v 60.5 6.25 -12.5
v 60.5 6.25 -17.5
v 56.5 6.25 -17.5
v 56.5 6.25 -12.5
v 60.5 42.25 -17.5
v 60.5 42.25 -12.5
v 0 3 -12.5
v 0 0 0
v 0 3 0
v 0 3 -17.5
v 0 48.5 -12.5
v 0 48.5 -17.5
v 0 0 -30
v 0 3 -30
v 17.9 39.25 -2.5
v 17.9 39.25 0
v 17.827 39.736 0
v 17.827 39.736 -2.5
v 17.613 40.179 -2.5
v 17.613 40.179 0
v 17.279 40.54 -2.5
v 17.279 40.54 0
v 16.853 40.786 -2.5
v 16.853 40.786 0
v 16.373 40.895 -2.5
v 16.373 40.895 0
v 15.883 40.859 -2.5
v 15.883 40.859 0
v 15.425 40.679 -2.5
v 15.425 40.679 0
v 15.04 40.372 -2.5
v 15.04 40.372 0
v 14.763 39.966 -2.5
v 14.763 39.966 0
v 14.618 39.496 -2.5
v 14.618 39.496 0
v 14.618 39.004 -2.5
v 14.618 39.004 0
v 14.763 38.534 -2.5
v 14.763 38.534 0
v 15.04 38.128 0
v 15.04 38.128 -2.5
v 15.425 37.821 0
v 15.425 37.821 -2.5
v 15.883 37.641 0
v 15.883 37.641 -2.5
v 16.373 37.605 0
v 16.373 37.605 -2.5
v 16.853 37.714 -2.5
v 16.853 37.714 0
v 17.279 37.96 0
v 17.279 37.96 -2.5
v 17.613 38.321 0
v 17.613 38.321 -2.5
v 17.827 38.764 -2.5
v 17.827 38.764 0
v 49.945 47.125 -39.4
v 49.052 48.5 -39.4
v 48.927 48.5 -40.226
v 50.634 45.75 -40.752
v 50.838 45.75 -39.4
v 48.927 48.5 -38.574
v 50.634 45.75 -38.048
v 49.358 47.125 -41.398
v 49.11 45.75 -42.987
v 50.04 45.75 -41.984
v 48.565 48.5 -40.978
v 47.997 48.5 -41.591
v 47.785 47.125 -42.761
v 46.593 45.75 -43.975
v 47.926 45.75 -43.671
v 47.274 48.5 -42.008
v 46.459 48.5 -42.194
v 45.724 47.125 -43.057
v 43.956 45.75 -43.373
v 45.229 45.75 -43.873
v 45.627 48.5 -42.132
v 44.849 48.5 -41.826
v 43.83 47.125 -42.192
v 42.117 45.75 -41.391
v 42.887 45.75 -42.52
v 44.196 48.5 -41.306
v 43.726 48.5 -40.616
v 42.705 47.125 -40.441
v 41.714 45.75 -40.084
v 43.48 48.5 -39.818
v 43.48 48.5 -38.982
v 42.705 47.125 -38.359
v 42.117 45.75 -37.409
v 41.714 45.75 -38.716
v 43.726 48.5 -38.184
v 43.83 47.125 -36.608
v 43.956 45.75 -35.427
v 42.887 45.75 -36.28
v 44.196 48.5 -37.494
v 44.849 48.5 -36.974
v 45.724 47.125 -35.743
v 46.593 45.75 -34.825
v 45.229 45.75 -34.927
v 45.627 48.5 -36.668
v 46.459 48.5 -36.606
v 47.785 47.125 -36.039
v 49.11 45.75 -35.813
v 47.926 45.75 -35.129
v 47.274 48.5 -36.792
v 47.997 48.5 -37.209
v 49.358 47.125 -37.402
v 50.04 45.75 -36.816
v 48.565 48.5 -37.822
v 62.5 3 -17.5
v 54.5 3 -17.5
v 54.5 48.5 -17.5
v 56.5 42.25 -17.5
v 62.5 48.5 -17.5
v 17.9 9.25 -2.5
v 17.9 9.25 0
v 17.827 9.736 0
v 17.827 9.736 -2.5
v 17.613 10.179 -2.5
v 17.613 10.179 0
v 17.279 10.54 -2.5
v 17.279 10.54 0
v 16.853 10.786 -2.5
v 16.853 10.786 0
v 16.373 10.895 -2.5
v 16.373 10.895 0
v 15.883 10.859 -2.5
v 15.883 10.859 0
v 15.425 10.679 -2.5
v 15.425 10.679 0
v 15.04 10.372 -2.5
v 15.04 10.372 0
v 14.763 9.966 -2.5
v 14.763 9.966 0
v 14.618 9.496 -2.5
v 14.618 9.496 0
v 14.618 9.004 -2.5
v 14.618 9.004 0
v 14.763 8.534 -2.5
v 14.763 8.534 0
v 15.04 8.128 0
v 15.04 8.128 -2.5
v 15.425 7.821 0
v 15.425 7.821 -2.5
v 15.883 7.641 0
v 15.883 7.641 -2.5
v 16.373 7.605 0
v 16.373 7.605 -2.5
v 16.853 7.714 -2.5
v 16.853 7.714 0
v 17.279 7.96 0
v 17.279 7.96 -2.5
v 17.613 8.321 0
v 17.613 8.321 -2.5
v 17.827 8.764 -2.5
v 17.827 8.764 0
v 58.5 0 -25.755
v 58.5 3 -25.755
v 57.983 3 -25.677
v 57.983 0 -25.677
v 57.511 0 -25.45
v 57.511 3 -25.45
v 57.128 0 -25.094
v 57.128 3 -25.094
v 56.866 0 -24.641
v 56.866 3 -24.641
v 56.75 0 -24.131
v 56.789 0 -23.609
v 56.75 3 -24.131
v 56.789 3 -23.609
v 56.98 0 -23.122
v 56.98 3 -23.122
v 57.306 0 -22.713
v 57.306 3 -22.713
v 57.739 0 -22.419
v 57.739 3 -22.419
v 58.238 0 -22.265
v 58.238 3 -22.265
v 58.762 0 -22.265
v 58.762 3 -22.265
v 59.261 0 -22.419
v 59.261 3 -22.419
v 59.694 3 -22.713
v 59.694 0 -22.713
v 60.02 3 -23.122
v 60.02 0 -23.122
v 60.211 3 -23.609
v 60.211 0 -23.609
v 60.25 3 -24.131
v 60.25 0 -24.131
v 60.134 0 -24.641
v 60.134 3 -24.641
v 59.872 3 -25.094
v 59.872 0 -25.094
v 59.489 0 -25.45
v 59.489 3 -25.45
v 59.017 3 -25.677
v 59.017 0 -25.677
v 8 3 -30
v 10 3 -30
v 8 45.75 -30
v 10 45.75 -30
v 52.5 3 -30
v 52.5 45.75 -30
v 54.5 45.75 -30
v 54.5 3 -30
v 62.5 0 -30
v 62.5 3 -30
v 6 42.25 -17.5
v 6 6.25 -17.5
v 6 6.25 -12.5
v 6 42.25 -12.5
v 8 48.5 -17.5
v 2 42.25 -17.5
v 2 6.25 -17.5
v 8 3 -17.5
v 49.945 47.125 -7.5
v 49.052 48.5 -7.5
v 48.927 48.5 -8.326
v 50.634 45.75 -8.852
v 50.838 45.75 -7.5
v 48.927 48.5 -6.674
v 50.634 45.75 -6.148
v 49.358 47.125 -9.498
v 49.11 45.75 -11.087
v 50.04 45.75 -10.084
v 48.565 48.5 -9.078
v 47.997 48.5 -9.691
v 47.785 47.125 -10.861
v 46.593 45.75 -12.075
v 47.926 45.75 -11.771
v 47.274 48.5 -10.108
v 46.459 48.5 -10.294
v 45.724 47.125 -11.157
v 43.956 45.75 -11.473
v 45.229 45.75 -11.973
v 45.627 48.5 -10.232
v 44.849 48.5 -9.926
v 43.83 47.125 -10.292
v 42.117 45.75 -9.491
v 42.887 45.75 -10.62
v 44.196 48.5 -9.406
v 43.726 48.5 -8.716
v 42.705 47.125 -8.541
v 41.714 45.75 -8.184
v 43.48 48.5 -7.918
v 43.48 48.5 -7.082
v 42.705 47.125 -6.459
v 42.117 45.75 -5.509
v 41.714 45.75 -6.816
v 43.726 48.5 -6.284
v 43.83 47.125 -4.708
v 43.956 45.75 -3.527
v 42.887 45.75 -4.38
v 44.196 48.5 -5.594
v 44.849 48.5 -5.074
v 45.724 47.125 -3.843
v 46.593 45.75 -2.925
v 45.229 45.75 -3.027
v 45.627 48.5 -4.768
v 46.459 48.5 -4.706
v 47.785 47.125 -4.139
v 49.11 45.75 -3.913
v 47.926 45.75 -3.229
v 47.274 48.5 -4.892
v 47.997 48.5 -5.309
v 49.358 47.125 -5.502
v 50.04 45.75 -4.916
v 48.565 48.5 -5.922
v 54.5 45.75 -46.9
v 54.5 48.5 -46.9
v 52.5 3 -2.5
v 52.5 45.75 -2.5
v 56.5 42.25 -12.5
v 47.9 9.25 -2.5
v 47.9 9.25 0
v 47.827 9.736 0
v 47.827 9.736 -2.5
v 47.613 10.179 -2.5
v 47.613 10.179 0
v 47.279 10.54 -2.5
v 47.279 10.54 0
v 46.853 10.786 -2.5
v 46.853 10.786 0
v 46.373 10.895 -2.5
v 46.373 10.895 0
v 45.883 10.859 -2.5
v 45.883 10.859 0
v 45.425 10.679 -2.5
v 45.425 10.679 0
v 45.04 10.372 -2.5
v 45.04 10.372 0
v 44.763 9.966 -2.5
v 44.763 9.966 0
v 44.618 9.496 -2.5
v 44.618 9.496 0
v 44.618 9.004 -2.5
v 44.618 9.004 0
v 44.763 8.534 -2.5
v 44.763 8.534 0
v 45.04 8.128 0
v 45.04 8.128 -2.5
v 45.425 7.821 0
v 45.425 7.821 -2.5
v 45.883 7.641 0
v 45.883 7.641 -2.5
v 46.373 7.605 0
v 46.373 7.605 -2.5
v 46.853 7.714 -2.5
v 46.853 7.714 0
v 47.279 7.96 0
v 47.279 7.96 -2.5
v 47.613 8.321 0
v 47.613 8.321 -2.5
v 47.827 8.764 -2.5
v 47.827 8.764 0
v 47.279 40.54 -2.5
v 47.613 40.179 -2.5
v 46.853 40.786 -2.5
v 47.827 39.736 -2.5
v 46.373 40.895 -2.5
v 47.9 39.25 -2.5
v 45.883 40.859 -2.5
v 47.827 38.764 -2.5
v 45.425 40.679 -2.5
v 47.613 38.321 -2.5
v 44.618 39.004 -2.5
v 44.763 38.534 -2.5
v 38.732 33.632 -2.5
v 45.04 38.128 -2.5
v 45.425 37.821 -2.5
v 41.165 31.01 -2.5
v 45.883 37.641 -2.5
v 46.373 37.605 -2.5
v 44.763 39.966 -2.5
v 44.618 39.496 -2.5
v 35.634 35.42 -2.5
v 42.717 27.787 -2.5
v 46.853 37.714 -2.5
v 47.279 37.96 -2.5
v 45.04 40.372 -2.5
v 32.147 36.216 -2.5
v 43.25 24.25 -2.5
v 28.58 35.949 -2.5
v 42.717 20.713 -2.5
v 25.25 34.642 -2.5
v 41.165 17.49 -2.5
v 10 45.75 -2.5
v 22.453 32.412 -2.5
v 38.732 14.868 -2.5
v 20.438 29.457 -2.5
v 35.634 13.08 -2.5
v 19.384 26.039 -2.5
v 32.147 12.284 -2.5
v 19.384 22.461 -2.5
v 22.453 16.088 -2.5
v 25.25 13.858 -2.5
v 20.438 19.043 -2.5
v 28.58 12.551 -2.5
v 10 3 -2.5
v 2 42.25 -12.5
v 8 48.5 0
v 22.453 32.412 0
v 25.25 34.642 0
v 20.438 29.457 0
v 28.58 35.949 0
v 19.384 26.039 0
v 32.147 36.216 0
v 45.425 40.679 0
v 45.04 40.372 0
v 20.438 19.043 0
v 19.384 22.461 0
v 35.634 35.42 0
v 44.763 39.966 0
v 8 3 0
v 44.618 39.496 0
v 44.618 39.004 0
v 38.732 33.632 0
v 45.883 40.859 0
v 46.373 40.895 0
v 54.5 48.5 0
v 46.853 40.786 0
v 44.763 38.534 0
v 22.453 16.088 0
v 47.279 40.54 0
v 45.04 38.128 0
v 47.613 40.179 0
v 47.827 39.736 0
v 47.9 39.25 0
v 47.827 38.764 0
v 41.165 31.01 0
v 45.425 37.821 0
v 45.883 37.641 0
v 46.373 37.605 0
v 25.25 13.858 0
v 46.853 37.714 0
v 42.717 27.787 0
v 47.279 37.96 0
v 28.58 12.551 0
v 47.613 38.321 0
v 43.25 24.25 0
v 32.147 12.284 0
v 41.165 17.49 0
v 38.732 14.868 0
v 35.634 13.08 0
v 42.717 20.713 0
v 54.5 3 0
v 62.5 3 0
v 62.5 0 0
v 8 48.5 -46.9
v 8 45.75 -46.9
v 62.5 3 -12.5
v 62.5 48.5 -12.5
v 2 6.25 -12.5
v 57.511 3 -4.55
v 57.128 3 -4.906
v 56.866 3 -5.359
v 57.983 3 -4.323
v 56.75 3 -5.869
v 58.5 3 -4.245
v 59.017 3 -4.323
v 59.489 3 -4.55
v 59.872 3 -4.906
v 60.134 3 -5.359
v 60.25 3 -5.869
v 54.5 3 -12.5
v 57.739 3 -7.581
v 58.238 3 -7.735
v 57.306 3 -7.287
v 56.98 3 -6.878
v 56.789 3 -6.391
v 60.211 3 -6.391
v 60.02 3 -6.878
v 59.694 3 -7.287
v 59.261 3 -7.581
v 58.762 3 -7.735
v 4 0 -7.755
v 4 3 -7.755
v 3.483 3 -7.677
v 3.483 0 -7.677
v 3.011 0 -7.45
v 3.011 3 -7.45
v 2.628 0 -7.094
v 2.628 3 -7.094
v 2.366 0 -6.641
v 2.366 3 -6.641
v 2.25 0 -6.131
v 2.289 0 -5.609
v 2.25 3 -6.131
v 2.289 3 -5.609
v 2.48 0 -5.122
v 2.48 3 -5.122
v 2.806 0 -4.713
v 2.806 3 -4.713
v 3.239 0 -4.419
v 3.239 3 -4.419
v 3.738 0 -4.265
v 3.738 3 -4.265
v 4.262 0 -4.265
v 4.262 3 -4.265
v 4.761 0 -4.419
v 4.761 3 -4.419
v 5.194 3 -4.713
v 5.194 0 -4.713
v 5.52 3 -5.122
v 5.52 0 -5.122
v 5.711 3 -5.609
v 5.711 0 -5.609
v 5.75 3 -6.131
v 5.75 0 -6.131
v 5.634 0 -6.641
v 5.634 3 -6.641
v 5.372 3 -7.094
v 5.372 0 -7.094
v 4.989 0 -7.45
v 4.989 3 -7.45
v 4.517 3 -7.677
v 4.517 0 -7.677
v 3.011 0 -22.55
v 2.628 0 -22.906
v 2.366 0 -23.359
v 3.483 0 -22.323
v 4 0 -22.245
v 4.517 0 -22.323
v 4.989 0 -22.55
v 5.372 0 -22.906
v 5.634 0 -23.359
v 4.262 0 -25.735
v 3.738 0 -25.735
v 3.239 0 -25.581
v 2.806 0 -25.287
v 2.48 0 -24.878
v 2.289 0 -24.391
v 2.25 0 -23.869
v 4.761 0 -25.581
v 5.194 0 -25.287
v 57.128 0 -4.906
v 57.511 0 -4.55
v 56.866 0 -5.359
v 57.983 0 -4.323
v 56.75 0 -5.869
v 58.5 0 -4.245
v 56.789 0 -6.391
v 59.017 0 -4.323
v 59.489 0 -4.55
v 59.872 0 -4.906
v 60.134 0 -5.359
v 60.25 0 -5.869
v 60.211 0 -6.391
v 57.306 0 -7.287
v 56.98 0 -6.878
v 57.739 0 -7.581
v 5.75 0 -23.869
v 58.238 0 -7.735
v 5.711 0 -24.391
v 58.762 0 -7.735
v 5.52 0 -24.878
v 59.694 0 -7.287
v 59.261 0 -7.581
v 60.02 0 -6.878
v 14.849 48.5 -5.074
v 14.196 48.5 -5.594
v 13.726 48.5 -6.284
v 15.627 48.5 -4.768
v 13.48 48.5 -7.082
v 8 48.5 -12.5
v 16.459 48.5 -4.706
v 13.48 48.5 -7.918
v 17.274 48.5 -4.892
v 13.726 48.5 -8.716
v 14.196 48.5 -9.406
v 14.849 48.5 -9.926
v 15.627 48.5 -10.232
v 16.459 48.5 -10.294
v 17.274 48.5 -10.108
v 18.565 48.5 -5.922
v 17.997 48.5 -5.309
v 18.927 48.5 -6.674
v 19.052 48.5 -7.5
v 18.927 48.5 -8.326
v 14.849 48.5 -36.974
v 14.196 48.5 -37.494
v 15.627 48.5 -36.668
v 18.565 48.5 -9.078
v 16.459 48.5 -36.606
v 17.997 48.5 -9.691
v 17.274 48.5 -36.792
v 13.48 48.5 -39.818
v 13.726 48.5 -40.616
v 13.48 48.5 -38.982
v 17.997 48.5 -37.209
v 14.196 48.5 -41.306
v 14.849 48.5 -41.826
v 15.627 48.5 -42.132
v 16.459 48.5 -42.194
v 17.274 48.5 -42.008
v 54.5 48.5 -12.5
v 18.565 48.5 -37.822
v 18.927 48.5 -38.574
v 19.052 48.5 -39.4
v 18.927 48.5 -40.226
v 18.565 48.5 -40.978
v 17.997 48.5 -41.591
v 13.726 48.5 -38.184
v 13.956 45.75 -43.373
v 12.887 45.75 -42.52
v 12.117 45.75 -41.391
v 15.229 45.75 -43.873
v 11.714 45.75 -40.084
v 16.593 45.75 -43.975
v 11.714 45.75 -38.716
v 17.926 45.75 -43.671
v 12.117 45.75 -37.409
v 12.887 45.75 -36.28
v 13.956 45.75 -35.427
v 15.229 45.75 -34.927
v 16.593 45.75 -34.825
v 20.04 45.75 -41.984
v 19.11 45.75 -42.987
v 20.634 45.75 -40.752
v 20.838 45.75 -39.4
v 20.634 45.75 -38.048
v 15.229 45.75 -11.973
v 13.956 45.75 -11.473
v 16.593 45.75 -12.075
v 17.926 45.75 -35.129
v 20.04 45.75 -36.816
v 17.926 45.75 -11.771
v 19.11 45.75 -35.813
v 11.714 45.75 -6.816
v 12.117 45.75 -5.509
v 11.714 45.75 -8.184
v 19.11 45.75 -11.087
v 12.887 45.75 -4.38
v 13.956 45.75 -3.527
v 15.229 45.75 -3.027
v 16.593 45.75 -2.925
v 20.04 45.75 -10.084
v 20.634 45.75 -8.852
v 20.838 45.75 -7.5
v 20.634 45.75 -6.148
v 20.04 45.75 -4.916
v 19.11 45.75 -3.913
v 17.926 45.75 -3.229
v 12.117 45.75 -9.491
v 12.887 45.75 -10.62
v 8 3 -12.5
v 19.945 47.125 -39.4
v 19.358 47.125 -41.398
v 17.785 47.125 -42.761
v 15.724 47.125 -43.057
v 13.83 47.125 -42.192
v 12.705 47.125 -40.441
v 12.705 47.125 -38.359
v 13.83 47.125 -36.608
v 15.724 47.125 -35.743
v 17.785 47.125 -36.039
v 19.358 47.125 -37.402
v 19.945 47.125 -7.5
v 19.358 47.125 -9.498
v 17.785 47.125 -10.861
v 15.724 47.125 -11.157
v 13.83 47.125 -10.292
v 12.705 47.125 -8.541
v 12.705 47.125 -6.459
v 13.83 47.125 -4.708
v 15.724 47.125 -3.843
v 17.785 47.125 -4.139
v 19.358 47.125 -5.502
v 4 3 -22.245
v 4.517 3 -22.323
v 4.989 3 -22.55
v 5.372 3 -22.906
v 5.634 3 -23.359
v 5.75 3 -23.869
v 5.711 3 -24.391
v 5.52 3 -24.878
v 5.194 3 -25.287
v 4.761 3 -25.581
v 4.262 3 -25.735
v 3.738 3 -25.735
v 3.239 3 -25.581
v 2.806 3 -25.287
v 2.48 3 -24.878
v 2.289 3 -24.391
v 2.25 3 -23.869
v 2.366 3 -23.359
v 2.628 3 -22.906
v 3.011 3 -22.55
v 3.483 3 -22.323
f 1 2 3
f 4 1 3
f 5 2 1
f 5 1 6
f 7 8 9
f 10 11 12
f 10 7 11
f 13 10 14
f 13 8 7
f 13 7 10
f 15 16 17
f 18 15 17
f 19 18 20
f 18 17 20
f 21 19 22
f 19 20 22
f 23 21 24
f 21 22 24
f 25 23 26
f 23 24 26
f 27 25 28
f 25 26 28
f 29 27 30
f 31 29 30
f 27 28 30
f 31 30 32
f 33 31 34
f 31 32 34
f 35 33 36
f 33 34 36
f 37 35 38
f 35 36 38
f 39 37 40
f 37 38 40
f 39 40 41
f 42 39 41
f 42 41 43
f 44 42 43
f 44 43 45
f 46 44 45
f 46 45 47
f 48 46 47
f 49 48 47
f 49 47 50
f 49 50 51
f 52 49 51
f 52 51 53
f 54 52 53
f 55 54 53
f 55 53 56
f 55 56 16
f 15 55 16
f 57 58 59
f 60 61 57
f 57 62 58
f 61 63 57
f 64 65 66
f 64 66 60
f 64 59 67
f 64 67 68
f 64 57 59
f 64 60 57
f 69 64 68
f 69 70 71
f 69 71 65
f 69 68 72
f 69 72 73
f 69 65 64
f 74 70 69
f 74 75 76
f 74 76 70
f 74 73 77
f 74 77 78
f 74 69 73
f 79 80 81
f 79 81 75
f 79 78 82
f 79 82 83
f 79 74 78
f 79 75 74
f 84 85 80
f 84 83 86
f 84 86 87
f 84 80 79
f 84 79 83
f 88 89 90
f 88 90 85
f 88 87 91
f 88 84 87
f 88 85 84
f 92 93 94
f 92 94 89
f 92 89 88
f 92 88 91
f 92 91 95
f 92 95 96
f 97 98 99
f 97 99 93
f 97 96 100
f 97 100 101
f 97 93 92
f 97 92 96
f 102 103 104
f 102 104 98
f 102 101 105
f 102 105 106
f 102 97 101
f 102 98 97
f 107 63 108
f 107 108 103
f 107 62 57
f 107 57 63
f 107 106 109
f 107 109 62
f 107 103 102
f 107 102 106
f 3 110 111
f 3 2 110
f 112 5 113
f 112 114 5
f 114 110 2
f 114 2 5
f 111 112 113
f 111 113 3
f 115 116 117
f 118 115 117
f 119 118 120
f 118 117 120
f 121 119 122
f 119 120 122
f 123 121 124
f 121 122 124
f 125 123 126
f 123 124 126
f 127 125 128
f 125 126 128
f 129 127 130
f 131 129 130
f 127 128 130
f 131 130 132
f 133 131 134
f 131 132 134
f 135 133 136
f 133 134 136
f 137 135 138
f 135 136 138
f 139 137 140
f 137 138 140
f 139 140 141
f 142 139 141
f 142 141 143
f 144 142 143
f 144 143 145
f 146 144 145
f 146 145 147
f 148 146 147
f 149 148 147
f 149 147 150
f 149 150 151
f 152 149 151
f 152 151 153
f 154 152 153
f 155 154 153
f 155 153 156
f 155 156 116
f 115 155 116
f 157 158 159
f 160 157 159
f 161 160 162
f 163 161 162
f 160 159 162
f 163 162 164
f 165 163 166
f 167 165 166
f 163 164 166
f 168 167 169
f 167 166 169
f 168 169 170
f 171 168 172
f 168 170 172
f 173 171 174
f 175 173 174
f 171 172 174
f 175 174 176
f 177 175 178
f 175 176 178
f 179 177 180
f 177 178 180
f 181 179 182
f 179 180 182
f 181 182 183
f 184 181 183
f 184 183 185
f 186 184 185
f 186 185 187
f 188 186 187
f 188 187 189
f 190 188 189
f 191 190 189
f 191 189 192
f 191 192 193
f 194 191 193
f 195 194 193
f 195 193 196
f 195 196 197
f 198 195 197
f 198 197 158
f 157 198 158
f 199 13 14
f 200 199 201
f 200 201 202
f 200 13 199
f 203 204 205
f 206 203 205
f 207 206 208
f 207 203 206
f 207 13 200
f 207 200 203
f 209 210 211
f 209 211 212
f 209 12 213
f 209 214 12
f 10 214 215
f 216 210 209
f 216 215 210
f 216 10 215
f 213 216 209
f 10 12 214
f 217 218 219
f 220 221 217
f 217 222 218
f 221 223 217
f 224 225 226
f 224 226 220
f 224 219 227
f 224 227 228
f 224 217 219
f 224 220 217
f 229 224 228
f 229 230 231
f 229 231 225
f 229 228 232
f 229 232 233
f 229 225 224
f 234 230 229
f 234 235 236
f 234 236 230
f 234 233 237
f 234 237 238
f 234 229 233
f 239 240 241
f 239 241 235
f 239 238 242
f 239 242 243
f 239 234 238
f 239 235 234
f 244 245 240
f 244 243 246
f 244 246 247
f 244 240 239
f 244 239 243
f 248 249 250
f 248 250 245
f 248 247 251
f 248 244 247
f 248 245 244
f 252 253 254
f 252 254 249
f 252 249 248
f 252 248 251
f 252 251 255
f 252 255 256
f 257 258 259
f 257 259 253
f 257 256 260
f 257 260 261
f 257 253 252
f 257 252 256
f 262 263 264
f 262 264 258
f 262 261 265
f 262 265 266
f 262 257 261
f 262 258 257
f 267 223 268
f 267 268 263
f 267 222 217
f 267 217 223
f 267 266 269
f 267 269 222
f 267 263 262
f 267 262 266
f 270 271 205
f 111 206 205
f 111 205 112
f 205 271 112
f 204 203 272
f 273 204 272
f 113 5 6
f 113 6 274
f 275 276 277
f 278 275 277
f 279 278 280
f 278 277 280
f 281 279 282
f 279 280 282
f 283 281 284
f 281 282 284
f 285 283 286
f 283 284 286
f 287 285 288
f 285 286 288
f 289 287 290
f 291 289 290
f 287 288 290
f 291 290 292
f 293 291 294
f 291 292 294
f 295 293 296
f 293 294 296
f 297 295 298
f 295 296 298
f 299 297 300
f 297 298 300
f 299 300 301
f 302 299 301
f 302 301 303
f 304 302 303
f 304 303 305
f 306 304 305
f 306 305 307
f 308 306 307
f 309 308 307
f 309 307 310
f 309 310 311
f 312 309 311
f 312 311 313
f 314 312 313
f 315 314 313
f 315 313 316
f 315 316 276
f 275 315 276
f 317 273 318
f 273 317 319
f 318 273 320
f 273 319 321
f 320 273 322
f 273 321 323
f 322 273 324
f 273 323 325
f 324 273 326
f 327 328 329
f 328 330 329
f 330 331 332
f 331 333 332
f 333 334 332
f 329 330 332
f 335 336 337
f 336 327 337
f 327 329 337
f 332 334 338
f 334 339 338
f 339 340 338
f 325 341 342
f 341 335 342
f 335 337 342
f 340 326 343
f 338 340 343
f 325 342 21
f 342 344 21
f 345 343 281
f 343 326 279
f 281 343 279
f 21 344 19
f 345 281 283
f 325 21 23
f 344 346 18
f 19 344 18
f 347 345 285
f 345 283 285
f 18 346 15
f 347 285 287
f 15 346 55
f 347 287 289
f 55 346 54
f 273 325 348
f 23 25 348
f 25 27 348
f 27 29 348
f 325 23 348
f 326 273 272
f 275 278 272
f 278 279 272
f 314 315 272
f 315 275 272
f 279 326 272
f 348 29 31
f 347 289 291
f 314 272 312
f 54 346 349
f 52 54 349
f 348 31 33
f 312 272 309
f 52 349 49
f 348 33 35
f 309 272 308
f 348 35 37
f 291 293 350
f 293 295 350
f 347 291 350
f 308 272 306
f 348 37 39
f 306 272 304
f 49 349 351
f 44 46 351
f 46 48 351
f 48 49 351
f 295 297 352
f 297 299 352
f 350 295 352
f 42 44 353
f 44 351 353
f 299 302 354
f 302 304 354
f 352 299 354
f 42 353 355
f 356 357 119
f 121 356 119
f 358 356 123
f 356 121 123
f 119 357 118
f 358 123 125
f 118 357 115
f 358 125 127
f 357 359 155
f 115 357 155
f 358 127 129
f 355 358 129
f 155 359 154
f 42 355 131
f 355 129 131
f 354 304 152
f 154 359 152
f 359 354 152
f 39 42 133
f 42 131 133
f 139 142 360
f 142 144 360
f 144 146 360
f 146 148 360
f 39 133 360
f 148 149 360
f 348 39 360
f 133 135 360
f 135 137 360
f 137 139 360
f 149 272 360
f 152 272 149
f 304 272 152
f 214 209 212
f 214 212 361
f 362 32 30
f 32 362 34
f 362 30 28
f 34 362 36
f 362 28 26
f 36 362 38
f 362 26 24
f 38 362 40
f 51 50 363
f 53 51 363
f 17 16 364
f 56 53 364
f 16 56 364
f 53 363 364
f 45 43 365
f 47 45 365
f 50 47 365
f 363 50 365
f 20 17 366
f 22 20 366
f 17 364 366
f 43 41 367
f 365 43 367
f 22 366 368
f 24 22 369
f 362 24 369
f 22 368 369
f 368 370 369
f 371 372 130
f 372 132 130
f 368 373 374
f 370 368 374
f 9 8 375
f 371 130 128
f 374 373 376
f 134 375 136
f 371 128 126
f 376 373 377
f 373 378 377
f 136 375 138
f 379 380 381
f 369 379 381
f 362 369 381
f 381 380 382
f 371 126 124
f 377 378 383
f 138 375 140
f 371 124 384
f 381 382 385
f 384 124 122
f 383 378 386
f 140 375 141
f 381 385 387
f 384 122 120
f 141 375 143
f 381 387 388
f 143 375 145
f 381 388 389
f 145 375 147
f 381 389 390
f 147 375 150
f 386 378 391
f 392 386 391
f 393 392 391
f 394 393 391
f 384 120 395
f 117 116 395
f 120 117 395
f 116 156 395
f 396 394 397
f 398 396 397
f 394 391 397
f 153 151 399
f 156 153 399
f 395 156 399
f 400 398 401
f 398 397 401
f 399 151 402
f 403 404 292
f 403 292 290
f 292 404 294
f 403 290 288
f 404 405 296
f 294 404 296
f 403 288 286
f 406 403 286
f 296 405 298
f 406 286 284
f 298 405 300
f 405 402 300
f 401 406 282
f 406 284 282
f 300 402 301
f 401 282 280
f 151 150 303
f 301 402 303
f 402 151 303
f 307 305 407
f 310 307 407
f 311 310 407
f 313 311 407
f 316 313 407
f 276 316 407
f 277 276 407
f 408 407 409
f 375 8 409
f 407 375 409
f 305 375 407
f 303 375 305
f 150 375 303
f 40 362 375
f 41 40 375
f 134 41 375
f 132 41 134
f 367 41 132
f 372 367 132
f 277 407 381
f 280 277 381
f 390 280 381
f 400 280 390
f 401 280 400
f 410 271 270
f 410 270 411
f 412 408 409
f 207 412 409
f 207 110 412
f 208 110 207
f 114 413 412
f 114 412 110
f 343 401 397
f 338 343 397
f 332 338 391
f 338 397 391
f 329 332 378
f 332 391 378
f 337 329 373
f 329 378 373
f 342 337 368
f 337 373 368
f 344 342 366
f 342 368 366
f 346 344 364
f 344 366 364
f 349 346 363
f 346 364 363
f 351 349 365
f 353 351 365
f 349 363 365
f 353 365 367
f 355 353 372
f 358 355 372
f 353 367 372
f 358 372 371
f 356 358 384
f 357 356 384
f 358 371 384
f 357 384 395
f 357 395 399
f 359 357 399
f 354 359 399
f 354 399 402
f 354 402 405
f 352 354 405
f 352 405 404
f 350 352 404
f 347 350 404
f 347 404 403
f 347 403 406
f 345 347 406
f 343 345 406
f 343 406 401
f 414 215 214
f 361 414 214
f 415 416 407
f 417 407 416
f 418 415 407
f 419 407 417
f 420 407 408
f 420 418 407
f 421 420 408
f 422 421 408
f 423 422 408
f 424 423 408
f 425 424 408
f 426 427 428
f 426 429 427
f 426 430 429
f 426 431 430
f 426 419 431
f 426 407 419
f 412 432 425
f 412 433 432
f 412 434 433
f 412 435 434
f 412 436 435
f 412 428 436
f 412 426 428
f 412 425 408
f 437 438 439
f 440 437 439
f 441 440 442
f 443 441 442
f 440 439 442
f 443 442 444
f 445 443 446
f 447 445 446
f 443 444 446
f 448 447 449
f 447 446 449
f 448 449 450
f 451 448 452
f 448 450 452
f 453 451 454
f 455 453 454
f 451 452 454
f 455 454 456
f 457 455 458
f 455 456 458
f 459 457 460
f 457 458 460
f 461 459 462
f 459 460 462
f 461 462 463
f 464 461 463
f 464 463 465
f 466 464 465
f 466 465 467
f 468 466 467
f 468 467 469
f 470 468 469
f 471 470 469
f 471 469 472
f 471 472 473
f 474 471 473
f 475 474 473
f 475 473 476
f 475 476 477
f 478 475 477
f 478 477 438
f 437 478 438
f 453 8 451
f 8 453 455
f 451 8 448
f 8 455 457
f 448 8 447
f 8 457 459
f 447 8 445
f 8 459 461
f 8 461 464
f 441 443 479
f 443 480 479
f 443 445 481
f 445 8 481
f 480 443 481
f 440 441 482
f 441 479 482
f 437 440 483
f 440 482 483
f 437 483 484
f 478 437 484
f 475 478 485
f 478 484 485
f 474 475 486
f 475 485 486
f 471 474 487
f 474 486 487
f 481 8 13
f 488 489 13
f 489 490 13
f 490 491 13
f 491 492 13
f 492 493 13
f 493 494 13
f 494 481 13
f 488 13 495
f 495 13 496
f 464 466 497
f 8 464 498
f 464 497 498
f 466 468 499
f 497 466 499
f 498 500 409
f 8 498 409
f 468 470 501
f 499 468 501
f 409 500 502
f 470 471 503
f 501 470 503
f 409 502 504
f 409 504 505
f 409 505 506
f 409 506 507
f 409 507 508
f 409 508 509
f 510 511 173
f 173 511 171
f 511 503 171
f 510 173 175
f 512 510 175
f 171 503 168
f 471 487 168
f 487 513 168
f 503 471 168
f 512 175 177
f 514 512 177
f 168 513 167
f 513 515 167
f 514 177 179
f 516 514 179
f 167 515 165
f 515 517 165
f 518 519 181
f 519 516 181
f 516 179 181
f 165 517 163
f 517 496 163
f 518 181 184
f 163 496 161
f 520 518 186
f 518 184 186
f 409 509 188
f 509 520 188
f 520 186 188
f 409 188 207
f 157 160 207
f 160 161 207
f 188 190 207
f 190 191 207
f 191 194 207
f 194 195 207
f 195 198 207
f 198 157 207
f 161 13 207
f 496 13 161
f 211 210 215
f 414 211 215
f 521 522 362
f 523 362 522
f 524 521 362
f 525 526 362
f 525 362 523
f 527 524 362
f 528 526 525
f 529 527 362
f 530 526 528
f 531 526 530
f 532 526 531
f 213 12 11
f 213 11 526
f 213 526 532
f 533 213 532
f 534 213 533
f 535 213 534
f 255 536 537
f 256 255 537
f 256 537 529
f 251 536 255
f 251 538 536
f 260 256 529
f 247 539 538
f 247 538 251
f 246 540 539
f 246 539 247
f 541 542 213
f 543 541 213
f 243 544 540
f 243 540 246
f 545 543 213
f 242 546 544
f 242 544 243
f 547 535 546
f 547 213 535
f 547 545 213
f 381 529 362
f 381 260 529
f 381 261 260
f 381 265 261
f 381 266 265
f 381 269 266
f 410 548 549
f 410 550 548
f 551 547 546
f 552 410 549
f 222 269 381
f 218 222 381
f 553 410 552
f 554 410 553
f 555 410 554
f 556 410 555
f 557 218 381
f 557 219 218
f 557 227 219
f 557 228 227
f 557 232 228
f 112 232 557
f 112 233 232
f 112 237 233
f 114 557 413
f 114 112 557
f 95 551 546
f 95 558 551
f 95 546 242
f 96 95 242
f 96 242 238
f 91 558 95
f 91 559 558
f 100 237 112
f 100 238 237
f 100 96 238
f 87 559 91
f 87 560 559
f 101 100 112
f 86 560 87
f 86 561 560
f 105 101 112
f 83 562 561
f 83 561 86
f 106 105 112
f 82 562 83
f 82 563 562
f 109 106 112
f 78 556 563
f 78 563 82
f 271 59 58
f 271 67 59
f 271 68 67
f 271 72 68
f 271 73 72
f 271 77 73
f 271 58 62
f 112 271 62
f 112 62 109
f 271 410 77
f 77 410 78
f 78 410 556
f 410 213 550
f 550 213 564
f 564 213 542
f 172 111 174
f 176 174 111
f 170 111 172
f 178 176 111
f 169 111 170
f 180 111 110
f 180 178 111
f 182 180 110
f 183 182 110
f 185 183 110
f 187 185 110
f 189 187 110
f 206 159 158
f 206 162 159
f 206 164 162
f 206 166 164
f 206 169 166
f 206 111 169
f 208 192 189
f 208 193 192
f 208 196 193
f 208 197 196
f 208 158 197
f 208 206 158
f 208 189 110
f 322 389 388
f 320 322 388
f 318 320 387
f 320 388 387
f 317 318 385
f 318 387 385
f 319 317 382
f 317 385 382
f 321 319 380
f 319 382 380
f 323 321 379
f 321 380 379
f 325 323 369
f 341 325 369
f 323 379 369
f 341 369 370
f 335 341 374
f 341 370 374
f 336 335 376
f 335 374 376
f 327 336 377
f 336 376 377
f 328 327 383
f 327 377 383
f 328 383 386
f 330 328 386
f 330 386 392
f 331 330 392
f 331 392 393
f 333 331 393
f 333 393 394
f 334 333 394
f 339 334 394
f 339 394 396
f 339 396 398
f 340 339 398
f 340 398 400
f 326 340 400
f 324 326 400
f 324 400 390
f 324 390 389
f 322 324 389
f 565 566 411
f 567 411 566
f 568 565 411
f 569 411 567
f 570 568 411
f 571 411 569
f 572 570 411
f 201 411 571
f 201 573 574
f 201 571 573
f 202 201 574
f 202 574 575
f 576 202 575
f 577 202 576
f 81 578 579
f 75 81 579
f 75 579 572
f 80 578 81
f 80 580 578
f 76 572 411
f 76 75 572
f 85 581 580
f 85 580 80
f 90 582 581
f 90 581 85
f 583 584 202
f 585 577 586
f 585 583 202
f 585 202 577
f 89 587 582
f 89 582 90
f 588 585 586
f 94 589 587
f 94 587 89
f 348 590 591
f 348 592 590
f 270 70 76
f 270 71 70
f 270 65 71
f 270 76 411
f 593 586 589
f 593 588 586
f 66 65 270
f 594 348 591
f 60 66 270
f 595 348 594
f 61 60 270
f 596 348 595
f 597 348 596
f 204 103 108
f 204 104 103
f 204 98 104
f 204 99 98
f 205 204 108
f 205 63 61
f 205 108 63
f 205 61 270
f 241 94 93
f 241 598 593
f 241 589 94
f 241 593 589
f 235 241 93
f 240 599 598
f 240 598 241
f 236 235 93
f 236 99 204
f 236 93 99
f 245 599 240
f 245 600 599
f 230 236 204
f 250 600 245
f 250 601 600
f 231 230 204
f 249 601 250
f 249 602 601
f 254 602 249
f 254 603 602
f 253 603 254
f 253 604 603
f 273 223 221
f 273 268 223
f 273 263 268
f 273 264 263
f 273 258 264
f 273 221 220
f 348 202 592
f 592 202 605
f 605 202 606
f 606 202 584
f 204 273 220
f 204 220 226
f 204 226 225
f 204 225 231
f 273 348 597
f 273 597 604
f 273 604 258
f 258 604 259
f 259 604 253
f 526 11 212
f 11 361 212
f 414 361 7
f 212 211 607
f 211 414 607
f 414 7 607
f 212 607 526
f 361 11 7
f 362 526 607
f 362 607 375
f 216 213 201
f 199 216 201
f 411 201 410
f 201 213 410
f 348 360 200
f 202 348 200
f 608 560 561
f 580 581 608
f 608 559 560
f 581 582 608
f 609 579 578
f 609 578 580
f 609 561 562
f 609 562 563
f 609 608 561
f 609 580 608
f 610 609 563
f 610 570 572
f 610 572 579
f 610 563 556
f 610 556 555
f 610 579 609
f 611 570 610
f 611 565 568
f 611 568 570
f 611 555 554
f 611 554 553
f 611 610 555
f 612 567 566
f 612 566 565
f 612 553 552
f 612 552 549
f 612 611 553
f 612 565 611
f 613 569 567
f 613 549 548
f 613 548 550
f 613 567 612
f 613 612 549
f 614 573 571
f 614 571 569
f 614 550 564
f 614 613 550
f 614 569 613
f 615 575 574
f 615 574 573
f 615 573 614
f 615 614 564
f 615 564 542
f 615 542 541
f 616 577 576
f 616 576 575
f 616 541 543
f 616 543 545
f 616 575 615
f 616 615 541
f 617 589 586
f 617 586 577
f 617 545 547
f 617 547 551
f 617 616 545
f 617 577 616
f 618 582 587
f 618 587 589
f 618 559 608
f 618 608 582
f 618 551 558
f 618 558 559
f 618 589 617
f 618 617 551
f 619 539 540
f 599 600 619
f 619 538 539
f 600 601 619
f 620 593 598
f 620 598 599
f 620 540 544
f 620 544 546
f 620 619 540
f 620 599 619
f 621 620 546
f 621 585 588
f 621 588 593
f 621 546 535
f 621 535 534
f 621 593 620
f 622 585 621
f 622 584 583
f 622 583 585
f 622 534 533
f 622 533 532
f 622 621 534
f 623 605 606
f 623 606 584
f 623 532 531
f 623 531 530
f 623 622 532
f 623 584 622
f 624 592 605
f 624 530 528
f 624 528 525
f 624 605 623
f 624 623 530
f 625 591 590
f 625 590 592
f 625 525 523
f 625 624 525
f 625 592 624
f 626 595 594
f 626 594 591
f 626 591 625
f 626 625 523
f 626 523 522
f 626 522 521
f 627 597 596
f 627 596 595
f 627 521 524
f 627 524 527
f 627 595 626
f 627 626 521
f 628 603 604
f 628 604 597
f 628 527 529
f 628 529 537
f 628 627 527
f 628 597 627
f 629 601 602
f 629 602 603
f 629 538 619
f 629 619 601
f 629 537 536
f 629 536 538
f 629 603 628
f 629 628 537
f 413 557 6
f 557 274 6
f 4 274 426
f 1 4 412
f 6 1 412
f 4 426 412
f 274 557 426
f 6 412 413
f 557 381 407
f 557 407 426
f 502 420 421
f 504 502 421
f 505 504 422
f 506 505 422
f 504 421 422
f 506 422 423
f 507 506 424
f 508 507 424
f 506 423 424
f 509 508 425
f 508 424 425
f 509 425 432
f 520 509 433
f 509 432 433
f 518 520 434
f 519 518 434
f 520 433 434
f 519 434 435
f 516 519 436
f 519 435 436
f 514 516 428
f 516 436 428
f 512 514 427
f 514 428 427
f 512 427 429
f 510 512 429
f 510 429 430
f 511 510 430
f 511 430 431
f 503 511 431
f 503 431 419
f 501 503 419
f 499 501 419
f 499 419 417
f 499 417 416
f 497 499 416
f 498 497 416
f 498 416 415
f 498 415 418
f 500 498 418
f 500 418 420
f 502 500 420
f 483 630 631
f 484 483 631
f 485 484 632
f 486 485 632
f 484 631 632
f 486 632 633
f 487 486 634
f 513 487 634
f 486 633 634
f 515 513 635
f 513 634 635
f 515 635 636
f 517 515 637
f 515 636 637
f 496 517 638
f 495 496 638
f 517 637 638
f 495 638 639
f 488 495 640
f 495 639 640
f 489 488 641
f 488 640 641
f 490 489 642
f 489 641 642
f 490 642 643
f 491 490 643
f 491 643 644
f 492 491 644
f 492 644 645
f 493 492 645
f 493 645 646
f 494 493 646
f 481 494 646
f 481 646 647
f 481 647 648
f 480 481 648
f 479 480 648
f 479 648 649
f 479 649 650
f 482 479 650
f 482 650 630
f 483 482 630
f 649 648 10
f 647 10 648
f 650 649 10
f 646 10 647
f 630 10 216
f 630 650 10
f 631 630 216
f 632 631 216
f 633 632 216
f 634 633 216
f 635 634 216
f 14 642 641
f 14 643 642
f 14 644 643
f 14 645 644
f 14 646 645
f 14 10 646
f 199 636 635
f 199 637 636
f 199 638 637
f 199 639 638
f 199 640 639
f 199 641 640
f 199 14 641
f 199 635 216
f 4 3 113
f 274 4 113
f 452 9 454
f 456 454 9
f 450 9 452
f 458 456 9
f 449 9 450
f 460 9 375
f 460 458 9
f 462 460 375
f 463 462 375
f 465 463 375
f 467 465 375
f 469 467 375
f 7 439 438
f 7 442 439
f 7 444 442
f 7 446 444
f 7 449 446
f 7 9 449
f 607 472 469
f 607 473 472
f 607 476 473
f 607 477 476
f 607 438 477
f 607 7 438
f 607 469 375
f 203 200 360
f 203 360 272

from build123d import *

# Parameters (mm, degrees)
SKETCH1_W           = 82
SKETCH1_H           = 30
SKETCH1_R           = 2
BOSS_EXTRUDE1_DEPTH = 3
BOSS_EXTRUDE2_DEPTH = 42.5
SKETCH4_R           = 12
SKETCH4_R_2         = 1.65
CUT_EXTRUDE2_DEPTH  = 99.459382488
SKETCH7_W           = 19.5
SKETCH7_H           = 30
CUT_EXTRUDE4_DEPTH  = 98.109474306
SKETCH8_W           = 8
SKETCH8_H           = 5
BOSS_EXTRUDE3_DEPTH = 42.5
SKETCH8_3_R         = 1.755
CUT_EXTRUDE5_DEPTH  = 82.317279836
SKETCH9_W           = 4
SKETCH9_H           = 36
CUT_EXTRUDE6_DEPTH  = 80.26380006
SKETCH10_W          = 46.5
SKETCH10_H          = 46.9
SKETCH10_R          = 4.75
BOSS_EXTRUDE4_DEPTH = 3
BOSS_EXTRUDE4_DRAFT = -33
SKETCH12_W          = 8
SKETCH12_H          = 5
BOSS_EXTRUDE6_DEPTH = 3
CUT_EXTRUDE7_DEPTH  = 3
CUT_EXTRUDE8_DEPTH  = 0.25


with BuildPart() as part:
    # Sketch1 → Boss-Extrude1 (new body)
    with BuildSketch(Plane(origin=(0, 0, 0), x_dir=(1, 0, 0), z_dir=(0, 1, 0))):
        with Locations((41, 15)):
            Rectangle(SKETCH1_W, SKETCH1_H)
        with Locations(Location((78, 23.86, 0), (0, 0, 270))):
            Circle(SKETCH1_R, mode=Mode.SUBTRACT)
        with Locations(Location((78, 5, 0), (0, 0, 270))):
            Circle(SKETCH1_R, mode=Mode.SUBTRACT)
    extrude(amount=BOSS_EXTRUDE1_DEPTH)

    # Sketch2 → Boss-Extrude2 (add)
    with BuildSketch(Plane(origin=(0, 3, 0), x_dir=(1, 0, 0), z_dir=(0, 1, 0))):
        Polygon((52.5, 2.5), (10, 2.5), (10, 30), (8, 30), (8, 0), (54.5, 0), (54.5, 30), (52.5, 30), align=None)
    extrude(amount=BOSS_EXTRUDE2_DEPTH)

    # Sketch4 → Cut-Extrude2 (cut, through all)
    with BuildSketch(Plane.XY):
        with Locations((31.25, 24.25)):
            Circle(SKETCH4_R)
        with Locations((16.25, 9.25)):
            Circle(SKETCH4_R_2)
        with Locations((16.25, 39.25)):
            Circle(SKETCH4_R_2)
        with Locations((46.25, 39.25)):
            Circle(SKETCH4_R_2)
        with Locations((46.25, 9.25)):
            Circle(SKETCH4_R_2)
    extrude(amount=-CUT_EXTRUDE2_DEPTH, mode=Mode.SUBTRACT)

    # Sketch7 → Cut-Extrude4 (cut, through all)
    with BuildSketch(Plane(origin=(0, 3, 0), x_dir=(1, 0, 0), z_dir=(0, 1, 0))):
        with Locations((72.25, 15)):
            Rectangle(SKETCH7_W, SKETCH7_H)
    extrude(amount=-CUT_EXTRUDE4_DEPTH, mode=Mode.SUBTRACT)

    # Sketch8 → Boss-Extrude3 (add)
    with BuildSketch(Plane(origin=(0, 3, 0), x_dir=(1, 0, 0), z_dir=(0, 1, 0))):
        with Locations((4, 15)):
            Rectangle(SKETCH8_W, SKETCH8_H)
        with Locations((58.5, 15)):
            Rectangle(SKETCH8_W, SKETCH8_H)
    extrude(amount=BOSS_EXTRUDE3_DEPTH)

    # Sketch8<3> → Cut-Extrude5 (cut, through all)
    with BuildSketch(Plane(origin=(0, 3, 0), x_dir=(1, 0, 0), z_dir=(0, 1, 0))):
        with Locations(Location((4, 24, 0), (0, 0, 270))):
            Circle(SKETCH8_3_R)
        with Locations(Location((4, 6, 0), (0, 0, 90))):
            Circle(SKETCH8_3_R)
        with Locations(Location((58.5, 6, 0), (0, 0, 270))):
            Circle(SKETCH8_3_R)
        with Locations(Location((58.5, 24, 0), (0, 0, 90))):
            Circle(SKETCH8_3_R)
    extrude(amount=-CUT_EXTRUDE5_DEPTH, mode=Mode.SUBTRACT)

    # Sketch9 → Cut-Extrude6 (cut, through all)
    with BuildSketch(Plane(origin=(0, 0, -17.5), x_dir=(-1, 0, 0), z_dir=(0, 0, -1))):
        with Locations((-58.5, 24.25)):
            Rectangle(SKETCH9_W, SKETCH9_H)
        with Locations((-4, 24.25)):
            Rectangle(SKETCH9_W, SKETCH9_H)
    extrude(amount=-CUT_EXTRUDE6_DEPTH, mode=Mode.SUBTRACT)


with BuildPart() as boss_extrude4_tool:
    # Sketch10 → Boss-Extrude4 (with draft: the straight prism first)
    with BuildSketch(Plane(origin=(0, 45.5, 0), x_dir=(1, 0, 0), z_dir=(0, 1, 0))):
        with Locations((31.25, 23.45)):
            Rectangle(SKETCH10_W, SKETCH10_H)
        with Locations((16.25, 7.5)):
            Circle(SKETCH10_R, mode=Mode.SUBTRACT)
        with Locations((46.25, 7.5)):
            Circle(SKETCH10_R, mode=Mode.SUBTRACT)
        with Locations((46.25, 39.4)):
            Circle(SKETCH10_R, mode=Mode.SUBTRACT)
        with Locations((16.25, 39.4)):
            Circle(SKETCH10_R, mode=Mode.SUBTRACT)
    extrude(amount=BOSS_EXTRUDE4_DEPTH)
    # Boss-Extrude4: the draft: its side faces are tilted about the plane it starts from
    boss_extrude4_sides = [boss_extrude4_tool.faces().sort_by_distance(p)[0] for p in [
        (31.25, 47, 0),
        (54.5, 47, -23.45),
        (31.25, 47, -46.9),
        (8, 47, -23.45),
        (11.5, 47, -7.5),
        (41.5, 47, -7.5),
        (41.5, 47, -39.4),
        (11.5, 47, -39.4),
    ]]
    draft(boss_extrude4_sides, Plane(origin=(0, 45.5, 0), x_dir=(1, 0, 0), z_dir=(0, 1, 0)), BOSS_EXTRUDE4_DRAFT)


with BuildPart() as part_1:
    add(part.part)

    # Boss-Extrude4: add boss_extrude4_tool
    add(boss_extrude4_tool.part)

    # Sketch12 → Boss-Extrude6 (add)
    with BuildSketch(Plane(origin=(0, 45.5, 0), x_dir=(1, 0, 0), z_dir=(0, 1, 0))):
        with Locations((4, 15)):
            Rectangle(SKETCH12_W, SKETCH12_H)
        with Locations((58.5, 15)):
            Rectangle(SKETCH12_W, SKETCH12_H)
    extrude(amount=BOSS_EXTRUDE6_DEPTH)

    # Sketch13 → Cut-Extrude7 (cut)
    with BuildSketch(Plane(origin=(0, 48.5, 0), x_dir=(1, 0, 0), z_dir=(0, 1, 0))):
        Polygon((56.44822278, 17.5), (54.5, 17.5), (54.5, 30), (54.5, 46.9), (8, 46.9), (8, 30), (8, 17.5), (6.05177722, 17.5), (6.05177722, 48.84822278), (56.44822278, 48.84822278), align=None)
        Polygon((54.5, 12.5), (56.44822278, 12.5), (56.44822278, -1.94822278), (6.05177722, -1.94822278), (6.05177722, 12.5), (8, 12.5), (8, 0), (54.5, 0), align=None)
    extrude(amount=-CUT_EXTRUDE7_DEPTH, mode=Mode.SUBTRACT)

    # Sketch15 → Cut-Extrude8 (cut)
    with BuildSketch(Plane.XZ.offset(-45.5)):
        Polygon((10, -2.5), (10, -30), (8, -30), (8, -46.9), (54.5, -46.9), (54.5, -30), (52.5, -30), (52.5, -2.5), align=None)
    extrude(amount=-CUT_EXTRUDE8_DEPTH, mode=Mode.SUBTRACT)


solid = part_1.part
